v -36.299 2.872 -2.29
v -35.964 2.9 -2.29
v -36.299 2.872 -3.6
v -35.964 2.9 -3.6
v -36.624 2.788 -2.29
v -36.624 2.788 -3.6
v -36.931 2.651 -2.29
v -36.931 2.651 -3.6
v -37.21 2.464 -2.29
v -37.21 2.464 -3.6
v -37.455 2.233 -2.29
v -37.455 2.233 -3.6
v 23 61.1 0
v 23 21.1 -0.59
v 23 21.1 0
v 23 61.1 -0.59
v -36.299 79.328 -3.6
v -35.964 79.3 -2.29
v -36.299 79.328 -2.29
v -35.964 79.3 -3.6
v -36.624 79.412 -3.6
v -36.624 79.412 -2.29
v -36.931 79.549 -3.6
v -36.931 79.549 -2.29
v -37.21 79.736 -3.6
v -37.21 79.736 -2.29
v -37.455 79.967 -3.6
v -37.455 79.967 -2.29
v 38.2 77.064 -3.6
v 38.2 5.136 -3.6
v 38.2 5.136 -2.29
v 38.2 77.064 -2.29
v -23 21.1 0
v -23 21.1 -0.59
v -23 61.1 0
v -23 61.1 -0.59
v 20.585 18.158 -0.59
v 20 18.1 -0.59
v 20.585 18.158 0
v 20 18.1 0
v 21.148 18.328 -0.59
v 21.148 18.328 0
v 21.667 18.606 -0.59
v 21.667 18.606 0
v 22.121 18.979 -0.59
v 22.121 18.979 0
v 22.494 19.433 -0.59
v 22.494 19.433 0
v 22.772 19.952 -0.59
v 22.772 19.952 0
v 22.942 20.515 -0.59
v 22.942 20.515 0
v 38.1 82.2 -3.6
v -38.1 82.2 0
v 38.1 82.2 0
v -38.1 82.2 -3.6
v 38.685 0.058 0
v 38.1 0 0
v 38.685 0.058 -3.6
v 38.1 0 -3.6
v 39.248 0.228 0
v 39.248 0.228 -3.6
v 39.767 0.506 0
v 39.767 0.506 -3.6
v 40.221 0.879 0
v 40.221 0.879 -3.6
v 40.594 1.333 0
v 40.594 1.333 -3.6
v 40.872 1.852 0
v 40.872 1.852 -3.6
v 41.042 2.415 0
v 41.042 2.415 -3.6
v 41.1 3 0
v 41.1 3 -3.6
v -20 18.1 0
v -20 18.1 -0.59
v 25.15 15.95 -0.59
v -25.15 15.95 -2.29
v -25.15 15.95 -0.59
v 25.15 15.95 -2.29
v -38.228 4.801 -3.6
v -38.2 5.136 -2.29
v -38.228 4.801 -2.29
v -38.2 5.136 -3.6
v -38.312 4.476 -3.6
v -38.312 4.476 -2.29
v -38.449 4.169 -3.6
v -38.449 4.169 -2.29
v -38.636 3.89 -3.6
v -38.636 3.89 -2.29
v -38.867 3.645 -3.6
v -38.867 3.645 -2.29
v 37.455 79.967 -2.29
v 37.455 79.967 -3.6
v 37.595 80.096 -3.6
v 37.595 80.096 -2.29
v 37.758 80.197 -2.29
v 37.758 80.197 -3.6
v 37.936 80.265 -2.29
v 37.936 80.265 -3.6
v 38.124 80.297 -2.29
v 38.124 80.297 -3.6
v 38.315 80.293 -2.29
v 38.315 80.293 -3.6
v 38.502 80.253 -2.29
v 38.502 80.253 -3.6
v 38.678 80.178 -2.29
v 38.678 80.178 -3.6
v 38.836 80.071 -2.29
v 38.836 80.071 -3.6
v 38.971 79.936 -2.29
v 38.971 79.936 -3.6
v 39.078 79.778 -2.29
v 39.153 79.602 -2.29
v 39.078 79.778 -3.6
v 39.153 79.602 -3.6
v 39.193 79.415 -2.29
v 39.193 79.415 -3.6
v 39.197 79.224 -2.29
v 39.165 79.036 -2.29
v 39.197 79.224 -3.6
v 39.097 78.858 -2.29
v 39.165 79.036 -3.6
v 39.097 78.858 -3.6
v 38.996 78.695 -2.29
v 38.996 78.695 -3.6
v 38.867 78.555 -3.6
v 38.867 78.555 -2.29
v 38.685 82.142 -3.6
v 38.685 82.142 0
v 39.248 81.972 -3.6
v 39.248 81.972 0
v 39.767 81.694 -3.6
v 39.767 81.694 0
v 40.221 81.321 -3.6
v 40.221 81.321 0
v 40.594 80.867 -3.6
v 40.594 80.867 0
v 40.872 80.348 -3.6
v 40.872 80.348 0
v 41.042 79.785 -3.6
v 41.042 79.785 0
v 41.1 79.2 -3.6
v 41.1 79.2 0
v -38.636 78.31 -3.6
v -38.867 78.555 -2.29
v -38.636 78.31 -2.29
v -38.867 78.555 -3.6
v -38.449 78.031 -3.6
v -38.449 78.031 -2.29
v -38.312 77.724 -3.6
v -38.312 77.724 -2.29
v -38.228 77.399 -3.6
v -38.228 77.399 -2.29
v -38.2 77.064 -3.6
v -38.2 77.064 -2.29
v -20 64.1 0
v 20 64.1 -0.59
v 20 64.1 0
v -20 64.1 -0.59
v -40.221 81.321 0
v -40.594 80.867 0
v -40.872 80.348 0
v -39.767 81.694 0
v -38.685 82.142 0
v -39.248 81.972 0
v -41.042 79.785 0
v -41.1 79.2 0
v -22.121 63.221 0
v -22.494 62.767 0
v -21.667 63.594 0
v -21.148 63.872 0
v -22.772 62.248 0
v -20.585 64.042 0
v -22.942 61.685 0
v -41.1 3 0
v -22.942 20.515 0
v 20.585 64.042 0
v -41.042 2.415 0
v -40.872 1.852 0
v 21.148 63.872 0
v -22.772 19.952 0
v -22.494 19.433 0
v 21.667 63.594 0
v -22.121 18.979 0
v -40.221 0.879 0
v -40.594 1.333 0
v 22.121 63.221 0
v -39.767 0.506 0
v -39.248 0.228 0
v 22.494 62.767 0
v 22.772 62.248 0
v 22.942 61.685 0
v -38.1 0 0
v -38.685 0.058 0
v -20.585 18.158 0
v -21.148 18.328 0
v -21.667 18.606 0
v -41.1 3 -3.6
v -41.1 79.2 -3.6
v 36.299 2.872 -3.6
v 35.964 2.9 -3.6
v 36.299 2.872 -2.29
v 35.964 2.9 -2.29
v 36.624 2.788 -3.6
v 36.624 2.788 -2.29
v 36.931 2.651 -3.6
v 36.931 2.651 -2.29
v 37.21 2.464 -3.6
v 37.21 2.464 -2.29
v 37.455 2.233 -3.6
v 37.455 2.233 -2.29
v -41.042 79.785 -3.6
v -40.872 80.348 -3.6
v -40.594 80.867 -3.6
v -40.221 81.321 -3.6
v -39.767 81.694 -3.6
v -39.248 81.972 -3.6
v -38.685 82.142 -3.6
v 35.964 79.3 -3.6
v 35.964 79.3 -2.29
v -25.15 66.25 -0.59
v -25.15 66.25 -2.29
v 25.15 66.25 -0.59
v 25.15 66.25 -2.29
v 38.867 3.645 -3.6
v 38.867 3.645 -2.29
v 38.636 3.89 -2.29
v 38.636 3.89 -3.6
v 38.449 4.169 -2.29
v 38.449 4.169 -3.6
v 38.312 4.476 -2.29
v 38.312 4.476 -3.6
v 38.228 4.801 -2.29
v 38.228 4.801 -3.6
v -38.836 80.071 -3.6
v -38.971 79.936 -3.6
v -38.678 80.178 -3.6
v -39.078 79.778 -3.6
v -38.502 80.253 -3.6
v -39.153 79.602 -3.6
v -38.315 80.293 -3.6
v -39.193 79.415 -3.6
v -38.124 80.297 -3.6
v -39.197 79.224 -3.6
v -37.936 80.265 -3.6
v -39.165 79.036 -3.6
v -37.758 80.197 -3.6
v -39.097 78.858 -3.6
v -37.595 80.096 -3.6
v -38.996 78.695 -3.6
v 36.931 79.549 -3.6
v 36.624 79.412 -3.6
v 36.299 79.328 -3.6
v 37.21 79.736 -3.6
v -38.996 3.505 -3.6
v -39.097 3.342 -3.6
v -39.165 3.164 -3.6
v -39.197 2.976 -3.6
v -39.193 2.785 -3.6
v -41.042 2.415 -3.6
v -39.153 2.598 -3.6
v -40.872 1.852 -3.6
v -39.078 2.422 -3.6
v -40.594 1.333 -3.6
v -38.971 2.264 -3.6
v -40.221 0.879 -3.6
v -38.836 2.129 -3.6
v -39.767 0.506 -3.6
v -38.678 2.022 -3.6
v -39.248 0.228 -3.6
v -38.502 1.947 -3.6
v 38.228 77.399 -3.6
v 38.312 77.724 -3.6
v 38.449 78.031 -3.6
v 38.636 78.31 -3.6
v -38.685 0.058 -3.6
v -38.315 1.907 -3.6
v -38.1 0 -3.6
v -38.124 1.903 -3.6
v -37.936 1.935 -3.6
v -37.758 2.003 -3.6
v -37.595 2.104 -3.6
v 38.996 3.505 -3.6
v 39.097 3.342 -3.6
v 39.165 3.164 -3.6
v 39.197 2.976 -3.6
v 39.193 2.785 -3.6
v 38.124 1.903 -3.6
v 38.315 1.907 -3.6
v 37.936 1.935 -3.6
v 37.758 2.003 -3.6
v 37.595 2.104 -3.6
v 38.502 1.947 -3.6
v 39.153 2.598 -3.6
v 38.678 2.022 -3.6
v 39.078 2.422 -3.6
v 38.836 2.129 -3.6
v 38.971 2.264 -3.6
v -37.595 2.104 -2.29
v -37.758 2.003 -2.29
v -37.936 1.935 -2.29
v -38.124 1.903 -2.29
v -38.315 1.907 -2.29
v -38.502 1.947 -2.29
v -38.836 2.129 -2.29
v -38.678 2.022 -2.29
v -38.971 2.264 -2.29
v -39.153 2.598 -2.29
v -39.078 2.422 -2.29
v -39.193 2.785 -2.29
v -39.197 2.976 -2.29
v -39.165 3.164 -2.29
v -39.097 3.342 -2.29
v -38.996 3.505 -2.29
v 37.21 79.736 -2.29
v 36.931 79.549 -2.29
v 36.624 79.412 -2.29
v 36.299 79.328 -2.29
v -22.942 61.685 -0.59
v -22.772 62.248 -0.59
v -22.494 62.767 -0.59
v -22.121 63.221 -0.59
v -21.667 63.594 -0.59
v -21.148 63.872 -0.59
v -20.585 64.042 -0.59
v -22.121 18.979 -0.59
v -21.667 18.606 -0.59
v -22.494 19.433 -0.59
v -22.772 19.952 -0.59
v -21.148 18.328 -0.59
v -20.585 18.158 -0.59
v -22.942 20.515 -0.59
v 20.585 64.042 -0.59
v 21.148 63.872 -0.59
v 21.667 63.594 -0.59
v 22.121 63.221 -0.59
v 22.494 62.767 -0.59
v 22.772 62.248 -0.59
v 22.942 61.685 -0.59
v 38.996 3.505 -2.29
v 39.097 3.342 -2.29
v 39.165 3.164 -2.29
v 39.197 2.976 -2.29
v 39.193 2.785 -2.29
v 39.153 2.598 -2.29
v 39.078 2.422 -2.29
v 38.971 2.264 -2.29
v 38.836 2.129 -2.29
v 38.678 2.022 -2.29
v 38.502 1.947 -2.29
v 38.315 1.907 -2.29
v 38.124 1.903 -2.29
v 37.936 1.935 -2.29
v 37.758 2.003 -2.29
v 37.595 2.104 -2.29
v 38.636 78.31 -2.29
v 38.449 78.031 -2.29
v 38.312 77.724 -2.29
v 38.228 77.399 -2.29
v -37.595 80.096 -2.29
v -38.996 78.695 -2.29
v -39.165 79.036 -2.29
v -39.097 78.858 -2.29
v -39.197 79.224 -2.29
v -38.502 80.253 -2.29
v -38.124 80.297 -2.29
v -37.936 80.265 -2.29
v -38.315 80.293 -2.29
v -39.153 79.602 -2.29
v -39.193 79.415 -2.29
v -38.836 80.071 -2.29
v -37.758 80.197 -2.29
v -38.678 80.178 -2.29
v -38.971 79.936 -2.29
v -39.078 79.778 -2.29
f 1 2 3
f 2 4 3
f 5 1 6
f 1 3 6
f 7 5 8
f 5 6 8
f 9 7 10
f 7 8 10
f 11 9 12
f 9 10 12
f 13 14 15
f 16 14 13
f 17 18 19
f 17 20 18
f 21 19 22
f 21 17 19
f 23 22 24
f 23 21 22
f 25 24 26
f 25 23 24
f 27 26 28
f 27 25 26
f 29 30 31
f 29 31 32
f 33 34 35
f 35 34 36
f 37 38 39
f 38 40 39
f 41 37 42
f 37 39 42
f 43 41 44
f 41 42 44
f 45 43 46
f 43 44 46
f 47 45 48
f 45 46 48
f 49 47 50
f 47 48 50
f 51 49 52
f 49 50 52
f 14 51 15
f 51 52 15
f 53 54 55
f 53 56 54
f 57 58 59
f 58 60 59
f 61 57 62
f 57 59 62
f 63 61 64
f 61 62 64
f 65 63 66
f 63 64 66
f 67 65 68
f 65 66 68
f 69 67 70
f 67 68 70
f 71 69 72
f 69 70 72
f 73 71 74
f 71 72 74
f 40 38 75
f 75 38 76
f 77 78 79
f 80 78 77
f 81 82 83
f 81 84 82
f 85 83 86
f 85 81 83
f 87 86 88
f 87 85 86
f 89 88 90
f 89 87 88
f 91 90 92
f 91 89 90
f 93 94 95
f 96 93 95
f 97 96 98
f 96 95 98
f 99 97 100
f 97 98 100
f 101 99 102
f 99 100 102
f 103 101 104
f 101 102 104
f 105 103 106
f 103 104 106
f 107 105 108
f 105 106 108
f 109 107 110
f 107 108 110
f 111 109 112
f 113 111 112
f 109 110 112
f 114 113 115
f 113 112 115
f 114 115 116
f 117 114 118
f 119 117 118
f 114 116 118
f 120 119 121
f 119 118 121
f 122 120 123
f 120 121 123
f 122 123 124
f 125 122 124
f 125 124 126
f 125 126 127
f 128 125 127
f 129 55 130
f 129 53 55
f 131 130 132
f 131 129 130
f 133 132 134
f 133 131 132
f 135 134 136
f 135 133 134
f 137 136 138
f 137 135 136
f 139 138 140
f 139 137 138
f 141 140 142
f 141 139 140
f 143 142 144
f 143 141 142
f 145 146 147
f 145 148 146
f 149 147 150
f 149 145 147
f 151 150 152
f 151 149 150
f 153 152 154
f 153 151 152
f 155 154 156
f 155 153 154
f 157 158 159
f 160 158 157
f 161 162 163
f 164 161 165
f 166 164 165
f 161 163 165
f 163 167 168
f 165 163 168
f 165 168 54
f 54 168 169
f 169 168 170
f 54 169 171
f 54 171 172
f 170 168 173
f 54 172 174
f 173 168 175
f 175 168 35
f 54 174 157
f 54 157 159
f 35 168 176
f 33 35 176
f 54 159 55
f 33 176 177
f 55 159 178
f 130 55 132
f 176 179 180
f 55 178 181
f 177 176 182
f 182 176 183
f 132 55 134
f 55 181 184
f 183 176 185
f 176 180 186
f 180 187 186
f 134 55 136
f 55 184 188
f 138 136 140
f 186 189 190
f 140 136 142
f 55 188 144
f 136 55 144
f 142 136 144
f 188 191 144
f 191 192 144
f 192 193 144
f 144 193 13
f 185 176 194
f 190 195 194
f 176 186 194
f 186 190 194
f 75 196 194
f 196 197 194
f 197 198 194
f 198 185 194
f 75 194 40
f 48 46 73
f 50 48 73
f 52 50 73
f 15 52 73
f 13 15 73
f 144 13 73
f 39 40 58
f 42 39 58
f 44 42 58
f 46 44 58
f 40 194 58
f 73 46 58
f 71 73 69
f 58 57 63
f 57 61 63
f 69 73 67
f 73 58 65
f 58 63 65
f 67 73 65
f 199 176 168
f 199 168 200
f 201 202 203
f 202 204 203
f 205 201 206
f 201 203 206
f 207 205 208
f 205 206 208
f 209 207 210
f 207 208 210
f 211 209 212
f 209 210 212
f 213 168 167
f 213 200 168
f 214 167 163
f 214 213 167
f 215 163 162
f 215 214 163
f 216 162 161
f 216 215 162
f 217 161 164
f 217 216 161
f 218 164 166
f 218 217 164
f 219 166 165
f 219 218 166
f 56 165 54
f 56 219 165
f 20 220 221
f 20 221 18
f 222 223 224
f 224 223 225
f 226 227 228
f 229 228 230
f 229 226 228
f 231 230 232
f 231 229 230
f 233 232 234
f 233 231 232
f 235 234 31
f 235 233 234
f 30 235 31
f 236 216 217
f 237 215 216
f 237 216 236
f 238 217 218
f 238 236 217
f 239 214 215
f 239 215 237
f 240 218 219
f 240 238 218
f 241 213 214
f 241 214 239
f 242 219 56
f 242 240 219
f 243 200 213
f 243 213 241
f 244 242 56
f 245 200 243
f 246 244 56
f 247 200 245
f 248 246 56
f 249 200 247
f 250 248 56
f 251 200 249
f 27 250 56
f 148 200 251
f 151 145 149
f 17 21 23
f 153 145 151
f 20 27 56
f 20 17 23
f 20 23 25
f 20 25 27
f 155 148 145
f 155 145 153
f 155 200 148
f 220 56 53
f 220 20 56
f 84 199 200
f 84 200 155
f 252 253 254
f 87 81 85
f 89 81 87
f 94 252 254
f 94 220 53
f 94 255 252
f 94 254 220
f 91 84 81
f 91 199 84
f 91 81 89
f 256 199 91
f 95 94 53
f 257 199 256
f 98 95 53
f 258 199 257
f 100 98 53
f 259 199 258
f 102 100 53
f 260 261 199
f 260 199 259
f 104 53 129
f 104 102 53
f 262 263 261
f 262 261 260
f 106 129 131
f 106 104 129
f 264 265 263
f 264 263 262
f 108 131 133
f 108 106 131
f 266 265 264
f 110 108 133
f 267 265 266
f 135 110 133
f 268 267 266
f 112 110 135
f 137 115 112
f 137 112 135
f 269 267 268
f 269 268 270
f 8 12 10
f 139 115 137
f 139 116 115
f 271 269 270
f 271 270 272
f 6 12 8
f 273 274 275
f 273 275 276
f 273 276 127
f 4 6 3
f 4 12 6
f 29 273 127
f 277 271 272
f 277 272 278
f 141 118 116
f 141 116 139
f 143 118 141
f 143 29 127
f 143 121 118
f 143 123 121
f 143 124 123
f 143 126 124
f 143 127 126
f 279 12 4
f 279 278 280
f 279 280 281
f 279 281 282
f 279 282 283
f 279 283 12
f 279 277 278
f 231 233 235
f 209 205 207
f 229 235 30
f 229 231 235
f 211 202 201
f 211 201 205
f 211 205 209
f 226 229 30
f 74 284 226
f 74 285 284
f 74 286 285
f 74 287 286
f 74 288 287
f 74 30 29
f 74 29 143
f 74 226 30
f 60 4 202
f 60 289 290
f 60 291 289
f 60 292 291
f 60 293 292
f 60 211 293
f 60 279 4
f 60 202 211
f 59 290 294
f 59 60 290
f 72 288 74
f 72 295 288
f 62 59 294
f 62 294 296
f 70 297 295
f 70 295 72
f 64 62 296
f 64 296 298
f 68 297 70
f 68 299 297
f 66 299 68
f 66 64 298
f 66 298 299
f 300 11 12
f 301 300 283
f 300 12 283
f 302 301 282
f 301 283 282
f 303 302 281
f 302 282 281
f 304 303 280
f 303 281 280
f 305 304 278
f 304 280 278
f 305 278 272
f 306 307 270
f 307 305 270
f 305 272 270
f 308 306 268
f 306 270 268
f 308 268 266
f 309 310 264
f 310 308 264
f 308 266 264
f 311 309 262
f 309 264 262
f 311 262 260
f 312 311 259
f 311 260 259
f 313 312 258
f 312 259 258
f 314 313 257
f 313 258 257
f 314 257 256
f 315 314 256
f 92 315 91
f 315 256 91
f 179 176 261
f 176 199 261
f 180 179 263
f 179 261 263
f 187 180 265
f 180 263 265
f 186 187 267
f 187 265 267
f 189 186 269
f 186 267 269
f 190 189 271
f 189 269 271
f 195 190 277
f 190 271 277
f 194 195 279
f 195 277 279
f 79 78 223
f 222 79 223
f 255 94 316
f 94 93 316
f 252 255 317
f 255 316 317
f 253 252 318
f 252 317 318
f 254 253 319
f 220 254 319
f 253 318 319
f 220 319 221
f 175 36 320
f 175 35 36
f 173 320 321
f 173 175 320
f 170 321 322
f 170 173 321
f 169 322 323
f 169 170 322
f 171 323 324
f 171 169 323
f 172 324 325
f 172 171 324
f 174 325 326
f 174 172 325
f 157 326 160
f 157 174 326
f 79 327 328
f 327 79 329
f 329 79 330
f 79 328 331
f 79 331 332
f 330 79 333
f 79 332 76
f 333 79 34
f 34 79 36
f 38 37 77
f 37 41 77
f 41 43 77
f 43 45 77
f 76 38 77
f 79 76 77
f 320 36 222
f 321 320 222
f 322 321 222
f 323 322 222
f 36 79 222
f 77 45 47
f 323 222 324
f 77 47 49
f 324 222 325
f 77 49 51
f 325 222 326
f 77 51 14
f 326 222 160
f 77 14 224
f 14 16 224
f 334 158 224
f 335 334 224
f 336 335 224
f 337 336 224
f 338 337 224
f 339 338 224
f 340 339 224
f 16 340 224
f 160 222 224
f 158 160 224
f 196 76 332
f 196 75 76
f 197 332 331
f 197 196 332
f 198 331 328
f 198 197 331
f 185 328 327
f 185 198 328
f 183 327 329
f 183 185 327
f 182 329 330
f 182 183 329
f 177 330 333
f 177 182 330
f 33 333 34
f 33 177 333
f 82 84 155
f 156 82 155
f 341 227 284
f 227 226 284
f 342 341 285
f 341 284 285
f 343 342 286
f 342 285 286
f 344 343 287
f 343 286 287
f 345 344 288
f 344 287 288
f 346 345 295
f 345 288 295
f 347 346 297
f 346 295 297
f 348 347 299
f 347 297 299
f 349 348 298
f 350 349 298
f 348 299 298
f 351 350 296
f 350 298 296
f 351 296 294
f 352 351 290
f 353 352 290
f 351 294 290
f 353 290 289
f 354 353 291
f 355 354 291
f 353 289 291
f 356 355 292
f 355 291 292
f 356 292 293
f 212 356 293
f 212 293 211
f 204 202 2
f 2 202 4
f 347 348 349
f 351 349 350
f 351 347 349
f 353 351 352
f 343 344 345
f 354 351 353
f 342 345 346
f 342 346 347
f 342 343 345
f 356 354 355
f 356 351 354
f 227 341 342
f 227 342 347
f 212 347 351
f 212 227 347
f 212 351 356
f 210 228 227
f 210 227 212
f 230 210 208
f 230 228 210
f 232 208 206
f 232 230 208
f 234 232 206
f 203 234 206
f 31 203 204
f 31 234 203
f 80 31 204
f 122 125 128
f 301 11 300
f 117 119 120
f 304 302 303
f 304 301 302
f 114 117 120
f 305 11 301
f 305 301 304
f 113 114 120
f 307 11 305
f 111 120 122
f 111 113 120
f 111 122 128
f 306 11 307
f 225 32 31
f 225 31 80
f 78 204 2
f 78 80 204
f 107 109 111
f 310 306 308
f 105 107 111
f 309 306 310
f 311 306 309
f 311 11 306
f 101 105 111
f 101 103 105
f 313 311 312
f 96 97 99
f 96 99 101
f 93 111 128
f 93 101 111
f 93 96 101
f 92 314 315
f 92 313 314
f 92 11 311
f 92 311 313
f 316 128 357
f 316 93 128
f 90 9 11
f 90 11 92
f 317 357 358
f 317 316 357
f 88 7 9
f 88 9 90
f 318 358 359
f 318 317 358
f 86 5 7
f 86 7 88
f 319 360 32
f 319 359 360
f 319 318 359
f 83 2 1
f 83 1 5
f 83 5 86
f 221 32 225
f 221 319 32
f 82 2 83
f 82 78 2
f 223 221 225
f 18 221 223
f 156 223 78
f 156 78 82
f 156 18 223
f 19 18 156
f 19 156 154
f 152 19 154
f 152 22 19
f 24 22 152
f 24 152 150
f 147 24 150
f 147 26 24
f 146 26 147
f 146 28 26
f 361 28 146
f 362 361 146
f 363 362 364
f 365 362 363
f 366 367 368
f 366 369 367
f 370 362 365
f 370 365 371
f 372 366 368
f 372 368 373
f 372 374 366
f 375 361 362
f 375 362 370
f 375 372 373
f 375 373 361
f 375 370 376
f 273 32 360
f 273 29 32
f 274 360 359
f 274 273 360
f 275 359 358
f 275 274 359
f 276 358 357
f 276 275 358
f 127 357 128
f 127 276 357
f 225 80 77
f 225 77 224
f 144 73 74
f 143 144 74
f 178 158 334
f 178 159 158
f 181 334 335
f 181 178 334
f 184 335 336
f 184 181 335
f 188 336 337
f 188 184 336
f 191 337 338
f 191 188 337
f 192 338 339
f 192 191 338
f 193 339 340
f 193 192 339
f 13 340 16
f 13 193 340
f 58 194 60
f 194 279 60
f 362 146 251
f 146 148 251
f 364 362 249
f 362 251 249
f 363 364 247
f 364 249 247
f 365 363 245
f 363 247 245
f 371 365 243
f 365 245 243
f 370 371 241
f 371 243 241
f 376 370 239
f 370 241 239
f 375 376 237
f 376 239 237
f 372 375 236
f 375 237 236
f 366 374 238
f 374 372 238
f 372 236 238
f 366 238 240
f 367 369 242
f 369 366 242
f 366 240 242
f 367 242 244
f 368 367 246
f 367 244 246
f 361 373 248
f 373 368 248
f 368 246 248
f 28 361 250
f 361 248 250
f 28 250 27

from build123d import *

# Parameters (mm, degrees)
SKETCH1_W           = 82.2
SKETCH1_H           = 3.6
BOSS_EXTRUDE1_DEPTH = 82.2
SKETCH2_W           = 76.4
SKETCH2_H           = 76.4
CUT_EXTRUDE1_DEPTH  = 1.31
SKETCH4_R           = 1
CUT_EXTRUDE3_DEPTH  = 1.31
SKETCH3_W           = 46
SKETCH3_H           = 46
CUT_EXTRUDE2_DEPTH  = 92.930920261
SKETCH6_W           = 50.3
SKETCH6_H           = 50.3
CUT_EXTRUDE4_DEPTH  = 1.7
FILLET1_R           = 3
FILLET2_R           = 2


with BuildPart() as part:
    # Sketch1 → Boss-Extrude1 (new body)
    with BuildSketch(Plane(origin=(0, 0, 0), x_dir=(1, 0, 0), z_dir=(0, 1, 0))):
        with Locations((0, 1.8)):
            Rectangle(SKETCH1_W, SKETCH1_H)
    extrude(amount=BOSS_EXTRUDE1_DEPTH)

    # Sketch2 → Cut-Extrude1 (cut)
    with BuildSketch(Plane(origin=(0, 0, -3.6), x_dir=(-1, 0, 0), z_dir=(0, 0, -1))):
        with Locations((0, 41.1)):
            Rectangle(SKETCH2_W, SKETCH2_H)
    extrude(amount=-CUT_EXTRUDE1_DEPTH, mode=Mode.SUBTRACT)

    # Sketch4 → Cut-Extrude3 (cut)
    with BuildSketch(Plane(origin=(0, 0, -3.6), x_dir=(-1, 0, 0), z_dir=(0, 0, -1))):
        with Locations((38.2, 2.9)):
            Circle(SKETCH4_R)
        with Locations((38.2, 79.3)):
            Circle(SKETCH4_R)
        with Locations((-38.2, 2.9)):
            Circle(SKETCH4_R)
        with Locations((-38.2, 79.3)):
            Circle(SKETCH4_R)
    extrude(amount=-CUT_EXTRUDE3_DEPTH, mode=Mode.SUBTRACT)

    # Sketch3 → Cut-Extrude2 (cut, through all)
    with BuildSketch(Plane(origin=(0, 0, -2.29), x_dir=(-1, 0, 0), z_dir=(0, 0, -1))):
        with Locations((0, 41.1)):
            Rectangle(SKETCH3_W, SKETCH3_H)
    extrude(amount=-CUT_EXTRUDE2_DEPTH, mode=Mode.SUBTRACT)

    # Sketch6 → Cut-Extrude4 (cut)
    with BuildSketch(Plane.XY.offset(-2.29)):
        with Locations((0, 41.1)):
            Rectangle(SKETCH6_W, SKETCH6_H)
    extrude(amount=CUT_EXTRUDE4_DEPTH, mode=Mode.SUBTRACT)

    # Fillet1
    fillet1_edges = [part.edges().sort_by_distance(p)[0] for p in [
        (-41.1, 82.2, -1.8),
        (41.1, 82.2, -1.8),
        (-41.1, 0, -1.8),
        (41.1, 0, -1.8),
        (23, 18.1, -0.295),
        (23, 64.1, -0.295),
        (-23, 64.1, -0.295),
        (-23, 18.1, -0.295),
    ]]
    fillet(fillet1_edges, radius=FILLET1_R)

    # Fillet2
    fillet2_edges = [part.edges().sort_by_distance(p)[0] for p in [
        (-37.2, 79.3, -2.945),
        (-38.2, 78.3, -2.945),
        (38.2, 3.9, -2.945),
        (37.2, 2.9, -2.945),
        (38.2, 78.3, -2.945),
        (37.2, 79.3, -2.945),
        (-38.2, 3.9, -2.945),
        (-37.2, 2.9, -2.945),
    ]]
    fillet(fillet2_edges, radius=FILLET2_R)


solid = part.part
